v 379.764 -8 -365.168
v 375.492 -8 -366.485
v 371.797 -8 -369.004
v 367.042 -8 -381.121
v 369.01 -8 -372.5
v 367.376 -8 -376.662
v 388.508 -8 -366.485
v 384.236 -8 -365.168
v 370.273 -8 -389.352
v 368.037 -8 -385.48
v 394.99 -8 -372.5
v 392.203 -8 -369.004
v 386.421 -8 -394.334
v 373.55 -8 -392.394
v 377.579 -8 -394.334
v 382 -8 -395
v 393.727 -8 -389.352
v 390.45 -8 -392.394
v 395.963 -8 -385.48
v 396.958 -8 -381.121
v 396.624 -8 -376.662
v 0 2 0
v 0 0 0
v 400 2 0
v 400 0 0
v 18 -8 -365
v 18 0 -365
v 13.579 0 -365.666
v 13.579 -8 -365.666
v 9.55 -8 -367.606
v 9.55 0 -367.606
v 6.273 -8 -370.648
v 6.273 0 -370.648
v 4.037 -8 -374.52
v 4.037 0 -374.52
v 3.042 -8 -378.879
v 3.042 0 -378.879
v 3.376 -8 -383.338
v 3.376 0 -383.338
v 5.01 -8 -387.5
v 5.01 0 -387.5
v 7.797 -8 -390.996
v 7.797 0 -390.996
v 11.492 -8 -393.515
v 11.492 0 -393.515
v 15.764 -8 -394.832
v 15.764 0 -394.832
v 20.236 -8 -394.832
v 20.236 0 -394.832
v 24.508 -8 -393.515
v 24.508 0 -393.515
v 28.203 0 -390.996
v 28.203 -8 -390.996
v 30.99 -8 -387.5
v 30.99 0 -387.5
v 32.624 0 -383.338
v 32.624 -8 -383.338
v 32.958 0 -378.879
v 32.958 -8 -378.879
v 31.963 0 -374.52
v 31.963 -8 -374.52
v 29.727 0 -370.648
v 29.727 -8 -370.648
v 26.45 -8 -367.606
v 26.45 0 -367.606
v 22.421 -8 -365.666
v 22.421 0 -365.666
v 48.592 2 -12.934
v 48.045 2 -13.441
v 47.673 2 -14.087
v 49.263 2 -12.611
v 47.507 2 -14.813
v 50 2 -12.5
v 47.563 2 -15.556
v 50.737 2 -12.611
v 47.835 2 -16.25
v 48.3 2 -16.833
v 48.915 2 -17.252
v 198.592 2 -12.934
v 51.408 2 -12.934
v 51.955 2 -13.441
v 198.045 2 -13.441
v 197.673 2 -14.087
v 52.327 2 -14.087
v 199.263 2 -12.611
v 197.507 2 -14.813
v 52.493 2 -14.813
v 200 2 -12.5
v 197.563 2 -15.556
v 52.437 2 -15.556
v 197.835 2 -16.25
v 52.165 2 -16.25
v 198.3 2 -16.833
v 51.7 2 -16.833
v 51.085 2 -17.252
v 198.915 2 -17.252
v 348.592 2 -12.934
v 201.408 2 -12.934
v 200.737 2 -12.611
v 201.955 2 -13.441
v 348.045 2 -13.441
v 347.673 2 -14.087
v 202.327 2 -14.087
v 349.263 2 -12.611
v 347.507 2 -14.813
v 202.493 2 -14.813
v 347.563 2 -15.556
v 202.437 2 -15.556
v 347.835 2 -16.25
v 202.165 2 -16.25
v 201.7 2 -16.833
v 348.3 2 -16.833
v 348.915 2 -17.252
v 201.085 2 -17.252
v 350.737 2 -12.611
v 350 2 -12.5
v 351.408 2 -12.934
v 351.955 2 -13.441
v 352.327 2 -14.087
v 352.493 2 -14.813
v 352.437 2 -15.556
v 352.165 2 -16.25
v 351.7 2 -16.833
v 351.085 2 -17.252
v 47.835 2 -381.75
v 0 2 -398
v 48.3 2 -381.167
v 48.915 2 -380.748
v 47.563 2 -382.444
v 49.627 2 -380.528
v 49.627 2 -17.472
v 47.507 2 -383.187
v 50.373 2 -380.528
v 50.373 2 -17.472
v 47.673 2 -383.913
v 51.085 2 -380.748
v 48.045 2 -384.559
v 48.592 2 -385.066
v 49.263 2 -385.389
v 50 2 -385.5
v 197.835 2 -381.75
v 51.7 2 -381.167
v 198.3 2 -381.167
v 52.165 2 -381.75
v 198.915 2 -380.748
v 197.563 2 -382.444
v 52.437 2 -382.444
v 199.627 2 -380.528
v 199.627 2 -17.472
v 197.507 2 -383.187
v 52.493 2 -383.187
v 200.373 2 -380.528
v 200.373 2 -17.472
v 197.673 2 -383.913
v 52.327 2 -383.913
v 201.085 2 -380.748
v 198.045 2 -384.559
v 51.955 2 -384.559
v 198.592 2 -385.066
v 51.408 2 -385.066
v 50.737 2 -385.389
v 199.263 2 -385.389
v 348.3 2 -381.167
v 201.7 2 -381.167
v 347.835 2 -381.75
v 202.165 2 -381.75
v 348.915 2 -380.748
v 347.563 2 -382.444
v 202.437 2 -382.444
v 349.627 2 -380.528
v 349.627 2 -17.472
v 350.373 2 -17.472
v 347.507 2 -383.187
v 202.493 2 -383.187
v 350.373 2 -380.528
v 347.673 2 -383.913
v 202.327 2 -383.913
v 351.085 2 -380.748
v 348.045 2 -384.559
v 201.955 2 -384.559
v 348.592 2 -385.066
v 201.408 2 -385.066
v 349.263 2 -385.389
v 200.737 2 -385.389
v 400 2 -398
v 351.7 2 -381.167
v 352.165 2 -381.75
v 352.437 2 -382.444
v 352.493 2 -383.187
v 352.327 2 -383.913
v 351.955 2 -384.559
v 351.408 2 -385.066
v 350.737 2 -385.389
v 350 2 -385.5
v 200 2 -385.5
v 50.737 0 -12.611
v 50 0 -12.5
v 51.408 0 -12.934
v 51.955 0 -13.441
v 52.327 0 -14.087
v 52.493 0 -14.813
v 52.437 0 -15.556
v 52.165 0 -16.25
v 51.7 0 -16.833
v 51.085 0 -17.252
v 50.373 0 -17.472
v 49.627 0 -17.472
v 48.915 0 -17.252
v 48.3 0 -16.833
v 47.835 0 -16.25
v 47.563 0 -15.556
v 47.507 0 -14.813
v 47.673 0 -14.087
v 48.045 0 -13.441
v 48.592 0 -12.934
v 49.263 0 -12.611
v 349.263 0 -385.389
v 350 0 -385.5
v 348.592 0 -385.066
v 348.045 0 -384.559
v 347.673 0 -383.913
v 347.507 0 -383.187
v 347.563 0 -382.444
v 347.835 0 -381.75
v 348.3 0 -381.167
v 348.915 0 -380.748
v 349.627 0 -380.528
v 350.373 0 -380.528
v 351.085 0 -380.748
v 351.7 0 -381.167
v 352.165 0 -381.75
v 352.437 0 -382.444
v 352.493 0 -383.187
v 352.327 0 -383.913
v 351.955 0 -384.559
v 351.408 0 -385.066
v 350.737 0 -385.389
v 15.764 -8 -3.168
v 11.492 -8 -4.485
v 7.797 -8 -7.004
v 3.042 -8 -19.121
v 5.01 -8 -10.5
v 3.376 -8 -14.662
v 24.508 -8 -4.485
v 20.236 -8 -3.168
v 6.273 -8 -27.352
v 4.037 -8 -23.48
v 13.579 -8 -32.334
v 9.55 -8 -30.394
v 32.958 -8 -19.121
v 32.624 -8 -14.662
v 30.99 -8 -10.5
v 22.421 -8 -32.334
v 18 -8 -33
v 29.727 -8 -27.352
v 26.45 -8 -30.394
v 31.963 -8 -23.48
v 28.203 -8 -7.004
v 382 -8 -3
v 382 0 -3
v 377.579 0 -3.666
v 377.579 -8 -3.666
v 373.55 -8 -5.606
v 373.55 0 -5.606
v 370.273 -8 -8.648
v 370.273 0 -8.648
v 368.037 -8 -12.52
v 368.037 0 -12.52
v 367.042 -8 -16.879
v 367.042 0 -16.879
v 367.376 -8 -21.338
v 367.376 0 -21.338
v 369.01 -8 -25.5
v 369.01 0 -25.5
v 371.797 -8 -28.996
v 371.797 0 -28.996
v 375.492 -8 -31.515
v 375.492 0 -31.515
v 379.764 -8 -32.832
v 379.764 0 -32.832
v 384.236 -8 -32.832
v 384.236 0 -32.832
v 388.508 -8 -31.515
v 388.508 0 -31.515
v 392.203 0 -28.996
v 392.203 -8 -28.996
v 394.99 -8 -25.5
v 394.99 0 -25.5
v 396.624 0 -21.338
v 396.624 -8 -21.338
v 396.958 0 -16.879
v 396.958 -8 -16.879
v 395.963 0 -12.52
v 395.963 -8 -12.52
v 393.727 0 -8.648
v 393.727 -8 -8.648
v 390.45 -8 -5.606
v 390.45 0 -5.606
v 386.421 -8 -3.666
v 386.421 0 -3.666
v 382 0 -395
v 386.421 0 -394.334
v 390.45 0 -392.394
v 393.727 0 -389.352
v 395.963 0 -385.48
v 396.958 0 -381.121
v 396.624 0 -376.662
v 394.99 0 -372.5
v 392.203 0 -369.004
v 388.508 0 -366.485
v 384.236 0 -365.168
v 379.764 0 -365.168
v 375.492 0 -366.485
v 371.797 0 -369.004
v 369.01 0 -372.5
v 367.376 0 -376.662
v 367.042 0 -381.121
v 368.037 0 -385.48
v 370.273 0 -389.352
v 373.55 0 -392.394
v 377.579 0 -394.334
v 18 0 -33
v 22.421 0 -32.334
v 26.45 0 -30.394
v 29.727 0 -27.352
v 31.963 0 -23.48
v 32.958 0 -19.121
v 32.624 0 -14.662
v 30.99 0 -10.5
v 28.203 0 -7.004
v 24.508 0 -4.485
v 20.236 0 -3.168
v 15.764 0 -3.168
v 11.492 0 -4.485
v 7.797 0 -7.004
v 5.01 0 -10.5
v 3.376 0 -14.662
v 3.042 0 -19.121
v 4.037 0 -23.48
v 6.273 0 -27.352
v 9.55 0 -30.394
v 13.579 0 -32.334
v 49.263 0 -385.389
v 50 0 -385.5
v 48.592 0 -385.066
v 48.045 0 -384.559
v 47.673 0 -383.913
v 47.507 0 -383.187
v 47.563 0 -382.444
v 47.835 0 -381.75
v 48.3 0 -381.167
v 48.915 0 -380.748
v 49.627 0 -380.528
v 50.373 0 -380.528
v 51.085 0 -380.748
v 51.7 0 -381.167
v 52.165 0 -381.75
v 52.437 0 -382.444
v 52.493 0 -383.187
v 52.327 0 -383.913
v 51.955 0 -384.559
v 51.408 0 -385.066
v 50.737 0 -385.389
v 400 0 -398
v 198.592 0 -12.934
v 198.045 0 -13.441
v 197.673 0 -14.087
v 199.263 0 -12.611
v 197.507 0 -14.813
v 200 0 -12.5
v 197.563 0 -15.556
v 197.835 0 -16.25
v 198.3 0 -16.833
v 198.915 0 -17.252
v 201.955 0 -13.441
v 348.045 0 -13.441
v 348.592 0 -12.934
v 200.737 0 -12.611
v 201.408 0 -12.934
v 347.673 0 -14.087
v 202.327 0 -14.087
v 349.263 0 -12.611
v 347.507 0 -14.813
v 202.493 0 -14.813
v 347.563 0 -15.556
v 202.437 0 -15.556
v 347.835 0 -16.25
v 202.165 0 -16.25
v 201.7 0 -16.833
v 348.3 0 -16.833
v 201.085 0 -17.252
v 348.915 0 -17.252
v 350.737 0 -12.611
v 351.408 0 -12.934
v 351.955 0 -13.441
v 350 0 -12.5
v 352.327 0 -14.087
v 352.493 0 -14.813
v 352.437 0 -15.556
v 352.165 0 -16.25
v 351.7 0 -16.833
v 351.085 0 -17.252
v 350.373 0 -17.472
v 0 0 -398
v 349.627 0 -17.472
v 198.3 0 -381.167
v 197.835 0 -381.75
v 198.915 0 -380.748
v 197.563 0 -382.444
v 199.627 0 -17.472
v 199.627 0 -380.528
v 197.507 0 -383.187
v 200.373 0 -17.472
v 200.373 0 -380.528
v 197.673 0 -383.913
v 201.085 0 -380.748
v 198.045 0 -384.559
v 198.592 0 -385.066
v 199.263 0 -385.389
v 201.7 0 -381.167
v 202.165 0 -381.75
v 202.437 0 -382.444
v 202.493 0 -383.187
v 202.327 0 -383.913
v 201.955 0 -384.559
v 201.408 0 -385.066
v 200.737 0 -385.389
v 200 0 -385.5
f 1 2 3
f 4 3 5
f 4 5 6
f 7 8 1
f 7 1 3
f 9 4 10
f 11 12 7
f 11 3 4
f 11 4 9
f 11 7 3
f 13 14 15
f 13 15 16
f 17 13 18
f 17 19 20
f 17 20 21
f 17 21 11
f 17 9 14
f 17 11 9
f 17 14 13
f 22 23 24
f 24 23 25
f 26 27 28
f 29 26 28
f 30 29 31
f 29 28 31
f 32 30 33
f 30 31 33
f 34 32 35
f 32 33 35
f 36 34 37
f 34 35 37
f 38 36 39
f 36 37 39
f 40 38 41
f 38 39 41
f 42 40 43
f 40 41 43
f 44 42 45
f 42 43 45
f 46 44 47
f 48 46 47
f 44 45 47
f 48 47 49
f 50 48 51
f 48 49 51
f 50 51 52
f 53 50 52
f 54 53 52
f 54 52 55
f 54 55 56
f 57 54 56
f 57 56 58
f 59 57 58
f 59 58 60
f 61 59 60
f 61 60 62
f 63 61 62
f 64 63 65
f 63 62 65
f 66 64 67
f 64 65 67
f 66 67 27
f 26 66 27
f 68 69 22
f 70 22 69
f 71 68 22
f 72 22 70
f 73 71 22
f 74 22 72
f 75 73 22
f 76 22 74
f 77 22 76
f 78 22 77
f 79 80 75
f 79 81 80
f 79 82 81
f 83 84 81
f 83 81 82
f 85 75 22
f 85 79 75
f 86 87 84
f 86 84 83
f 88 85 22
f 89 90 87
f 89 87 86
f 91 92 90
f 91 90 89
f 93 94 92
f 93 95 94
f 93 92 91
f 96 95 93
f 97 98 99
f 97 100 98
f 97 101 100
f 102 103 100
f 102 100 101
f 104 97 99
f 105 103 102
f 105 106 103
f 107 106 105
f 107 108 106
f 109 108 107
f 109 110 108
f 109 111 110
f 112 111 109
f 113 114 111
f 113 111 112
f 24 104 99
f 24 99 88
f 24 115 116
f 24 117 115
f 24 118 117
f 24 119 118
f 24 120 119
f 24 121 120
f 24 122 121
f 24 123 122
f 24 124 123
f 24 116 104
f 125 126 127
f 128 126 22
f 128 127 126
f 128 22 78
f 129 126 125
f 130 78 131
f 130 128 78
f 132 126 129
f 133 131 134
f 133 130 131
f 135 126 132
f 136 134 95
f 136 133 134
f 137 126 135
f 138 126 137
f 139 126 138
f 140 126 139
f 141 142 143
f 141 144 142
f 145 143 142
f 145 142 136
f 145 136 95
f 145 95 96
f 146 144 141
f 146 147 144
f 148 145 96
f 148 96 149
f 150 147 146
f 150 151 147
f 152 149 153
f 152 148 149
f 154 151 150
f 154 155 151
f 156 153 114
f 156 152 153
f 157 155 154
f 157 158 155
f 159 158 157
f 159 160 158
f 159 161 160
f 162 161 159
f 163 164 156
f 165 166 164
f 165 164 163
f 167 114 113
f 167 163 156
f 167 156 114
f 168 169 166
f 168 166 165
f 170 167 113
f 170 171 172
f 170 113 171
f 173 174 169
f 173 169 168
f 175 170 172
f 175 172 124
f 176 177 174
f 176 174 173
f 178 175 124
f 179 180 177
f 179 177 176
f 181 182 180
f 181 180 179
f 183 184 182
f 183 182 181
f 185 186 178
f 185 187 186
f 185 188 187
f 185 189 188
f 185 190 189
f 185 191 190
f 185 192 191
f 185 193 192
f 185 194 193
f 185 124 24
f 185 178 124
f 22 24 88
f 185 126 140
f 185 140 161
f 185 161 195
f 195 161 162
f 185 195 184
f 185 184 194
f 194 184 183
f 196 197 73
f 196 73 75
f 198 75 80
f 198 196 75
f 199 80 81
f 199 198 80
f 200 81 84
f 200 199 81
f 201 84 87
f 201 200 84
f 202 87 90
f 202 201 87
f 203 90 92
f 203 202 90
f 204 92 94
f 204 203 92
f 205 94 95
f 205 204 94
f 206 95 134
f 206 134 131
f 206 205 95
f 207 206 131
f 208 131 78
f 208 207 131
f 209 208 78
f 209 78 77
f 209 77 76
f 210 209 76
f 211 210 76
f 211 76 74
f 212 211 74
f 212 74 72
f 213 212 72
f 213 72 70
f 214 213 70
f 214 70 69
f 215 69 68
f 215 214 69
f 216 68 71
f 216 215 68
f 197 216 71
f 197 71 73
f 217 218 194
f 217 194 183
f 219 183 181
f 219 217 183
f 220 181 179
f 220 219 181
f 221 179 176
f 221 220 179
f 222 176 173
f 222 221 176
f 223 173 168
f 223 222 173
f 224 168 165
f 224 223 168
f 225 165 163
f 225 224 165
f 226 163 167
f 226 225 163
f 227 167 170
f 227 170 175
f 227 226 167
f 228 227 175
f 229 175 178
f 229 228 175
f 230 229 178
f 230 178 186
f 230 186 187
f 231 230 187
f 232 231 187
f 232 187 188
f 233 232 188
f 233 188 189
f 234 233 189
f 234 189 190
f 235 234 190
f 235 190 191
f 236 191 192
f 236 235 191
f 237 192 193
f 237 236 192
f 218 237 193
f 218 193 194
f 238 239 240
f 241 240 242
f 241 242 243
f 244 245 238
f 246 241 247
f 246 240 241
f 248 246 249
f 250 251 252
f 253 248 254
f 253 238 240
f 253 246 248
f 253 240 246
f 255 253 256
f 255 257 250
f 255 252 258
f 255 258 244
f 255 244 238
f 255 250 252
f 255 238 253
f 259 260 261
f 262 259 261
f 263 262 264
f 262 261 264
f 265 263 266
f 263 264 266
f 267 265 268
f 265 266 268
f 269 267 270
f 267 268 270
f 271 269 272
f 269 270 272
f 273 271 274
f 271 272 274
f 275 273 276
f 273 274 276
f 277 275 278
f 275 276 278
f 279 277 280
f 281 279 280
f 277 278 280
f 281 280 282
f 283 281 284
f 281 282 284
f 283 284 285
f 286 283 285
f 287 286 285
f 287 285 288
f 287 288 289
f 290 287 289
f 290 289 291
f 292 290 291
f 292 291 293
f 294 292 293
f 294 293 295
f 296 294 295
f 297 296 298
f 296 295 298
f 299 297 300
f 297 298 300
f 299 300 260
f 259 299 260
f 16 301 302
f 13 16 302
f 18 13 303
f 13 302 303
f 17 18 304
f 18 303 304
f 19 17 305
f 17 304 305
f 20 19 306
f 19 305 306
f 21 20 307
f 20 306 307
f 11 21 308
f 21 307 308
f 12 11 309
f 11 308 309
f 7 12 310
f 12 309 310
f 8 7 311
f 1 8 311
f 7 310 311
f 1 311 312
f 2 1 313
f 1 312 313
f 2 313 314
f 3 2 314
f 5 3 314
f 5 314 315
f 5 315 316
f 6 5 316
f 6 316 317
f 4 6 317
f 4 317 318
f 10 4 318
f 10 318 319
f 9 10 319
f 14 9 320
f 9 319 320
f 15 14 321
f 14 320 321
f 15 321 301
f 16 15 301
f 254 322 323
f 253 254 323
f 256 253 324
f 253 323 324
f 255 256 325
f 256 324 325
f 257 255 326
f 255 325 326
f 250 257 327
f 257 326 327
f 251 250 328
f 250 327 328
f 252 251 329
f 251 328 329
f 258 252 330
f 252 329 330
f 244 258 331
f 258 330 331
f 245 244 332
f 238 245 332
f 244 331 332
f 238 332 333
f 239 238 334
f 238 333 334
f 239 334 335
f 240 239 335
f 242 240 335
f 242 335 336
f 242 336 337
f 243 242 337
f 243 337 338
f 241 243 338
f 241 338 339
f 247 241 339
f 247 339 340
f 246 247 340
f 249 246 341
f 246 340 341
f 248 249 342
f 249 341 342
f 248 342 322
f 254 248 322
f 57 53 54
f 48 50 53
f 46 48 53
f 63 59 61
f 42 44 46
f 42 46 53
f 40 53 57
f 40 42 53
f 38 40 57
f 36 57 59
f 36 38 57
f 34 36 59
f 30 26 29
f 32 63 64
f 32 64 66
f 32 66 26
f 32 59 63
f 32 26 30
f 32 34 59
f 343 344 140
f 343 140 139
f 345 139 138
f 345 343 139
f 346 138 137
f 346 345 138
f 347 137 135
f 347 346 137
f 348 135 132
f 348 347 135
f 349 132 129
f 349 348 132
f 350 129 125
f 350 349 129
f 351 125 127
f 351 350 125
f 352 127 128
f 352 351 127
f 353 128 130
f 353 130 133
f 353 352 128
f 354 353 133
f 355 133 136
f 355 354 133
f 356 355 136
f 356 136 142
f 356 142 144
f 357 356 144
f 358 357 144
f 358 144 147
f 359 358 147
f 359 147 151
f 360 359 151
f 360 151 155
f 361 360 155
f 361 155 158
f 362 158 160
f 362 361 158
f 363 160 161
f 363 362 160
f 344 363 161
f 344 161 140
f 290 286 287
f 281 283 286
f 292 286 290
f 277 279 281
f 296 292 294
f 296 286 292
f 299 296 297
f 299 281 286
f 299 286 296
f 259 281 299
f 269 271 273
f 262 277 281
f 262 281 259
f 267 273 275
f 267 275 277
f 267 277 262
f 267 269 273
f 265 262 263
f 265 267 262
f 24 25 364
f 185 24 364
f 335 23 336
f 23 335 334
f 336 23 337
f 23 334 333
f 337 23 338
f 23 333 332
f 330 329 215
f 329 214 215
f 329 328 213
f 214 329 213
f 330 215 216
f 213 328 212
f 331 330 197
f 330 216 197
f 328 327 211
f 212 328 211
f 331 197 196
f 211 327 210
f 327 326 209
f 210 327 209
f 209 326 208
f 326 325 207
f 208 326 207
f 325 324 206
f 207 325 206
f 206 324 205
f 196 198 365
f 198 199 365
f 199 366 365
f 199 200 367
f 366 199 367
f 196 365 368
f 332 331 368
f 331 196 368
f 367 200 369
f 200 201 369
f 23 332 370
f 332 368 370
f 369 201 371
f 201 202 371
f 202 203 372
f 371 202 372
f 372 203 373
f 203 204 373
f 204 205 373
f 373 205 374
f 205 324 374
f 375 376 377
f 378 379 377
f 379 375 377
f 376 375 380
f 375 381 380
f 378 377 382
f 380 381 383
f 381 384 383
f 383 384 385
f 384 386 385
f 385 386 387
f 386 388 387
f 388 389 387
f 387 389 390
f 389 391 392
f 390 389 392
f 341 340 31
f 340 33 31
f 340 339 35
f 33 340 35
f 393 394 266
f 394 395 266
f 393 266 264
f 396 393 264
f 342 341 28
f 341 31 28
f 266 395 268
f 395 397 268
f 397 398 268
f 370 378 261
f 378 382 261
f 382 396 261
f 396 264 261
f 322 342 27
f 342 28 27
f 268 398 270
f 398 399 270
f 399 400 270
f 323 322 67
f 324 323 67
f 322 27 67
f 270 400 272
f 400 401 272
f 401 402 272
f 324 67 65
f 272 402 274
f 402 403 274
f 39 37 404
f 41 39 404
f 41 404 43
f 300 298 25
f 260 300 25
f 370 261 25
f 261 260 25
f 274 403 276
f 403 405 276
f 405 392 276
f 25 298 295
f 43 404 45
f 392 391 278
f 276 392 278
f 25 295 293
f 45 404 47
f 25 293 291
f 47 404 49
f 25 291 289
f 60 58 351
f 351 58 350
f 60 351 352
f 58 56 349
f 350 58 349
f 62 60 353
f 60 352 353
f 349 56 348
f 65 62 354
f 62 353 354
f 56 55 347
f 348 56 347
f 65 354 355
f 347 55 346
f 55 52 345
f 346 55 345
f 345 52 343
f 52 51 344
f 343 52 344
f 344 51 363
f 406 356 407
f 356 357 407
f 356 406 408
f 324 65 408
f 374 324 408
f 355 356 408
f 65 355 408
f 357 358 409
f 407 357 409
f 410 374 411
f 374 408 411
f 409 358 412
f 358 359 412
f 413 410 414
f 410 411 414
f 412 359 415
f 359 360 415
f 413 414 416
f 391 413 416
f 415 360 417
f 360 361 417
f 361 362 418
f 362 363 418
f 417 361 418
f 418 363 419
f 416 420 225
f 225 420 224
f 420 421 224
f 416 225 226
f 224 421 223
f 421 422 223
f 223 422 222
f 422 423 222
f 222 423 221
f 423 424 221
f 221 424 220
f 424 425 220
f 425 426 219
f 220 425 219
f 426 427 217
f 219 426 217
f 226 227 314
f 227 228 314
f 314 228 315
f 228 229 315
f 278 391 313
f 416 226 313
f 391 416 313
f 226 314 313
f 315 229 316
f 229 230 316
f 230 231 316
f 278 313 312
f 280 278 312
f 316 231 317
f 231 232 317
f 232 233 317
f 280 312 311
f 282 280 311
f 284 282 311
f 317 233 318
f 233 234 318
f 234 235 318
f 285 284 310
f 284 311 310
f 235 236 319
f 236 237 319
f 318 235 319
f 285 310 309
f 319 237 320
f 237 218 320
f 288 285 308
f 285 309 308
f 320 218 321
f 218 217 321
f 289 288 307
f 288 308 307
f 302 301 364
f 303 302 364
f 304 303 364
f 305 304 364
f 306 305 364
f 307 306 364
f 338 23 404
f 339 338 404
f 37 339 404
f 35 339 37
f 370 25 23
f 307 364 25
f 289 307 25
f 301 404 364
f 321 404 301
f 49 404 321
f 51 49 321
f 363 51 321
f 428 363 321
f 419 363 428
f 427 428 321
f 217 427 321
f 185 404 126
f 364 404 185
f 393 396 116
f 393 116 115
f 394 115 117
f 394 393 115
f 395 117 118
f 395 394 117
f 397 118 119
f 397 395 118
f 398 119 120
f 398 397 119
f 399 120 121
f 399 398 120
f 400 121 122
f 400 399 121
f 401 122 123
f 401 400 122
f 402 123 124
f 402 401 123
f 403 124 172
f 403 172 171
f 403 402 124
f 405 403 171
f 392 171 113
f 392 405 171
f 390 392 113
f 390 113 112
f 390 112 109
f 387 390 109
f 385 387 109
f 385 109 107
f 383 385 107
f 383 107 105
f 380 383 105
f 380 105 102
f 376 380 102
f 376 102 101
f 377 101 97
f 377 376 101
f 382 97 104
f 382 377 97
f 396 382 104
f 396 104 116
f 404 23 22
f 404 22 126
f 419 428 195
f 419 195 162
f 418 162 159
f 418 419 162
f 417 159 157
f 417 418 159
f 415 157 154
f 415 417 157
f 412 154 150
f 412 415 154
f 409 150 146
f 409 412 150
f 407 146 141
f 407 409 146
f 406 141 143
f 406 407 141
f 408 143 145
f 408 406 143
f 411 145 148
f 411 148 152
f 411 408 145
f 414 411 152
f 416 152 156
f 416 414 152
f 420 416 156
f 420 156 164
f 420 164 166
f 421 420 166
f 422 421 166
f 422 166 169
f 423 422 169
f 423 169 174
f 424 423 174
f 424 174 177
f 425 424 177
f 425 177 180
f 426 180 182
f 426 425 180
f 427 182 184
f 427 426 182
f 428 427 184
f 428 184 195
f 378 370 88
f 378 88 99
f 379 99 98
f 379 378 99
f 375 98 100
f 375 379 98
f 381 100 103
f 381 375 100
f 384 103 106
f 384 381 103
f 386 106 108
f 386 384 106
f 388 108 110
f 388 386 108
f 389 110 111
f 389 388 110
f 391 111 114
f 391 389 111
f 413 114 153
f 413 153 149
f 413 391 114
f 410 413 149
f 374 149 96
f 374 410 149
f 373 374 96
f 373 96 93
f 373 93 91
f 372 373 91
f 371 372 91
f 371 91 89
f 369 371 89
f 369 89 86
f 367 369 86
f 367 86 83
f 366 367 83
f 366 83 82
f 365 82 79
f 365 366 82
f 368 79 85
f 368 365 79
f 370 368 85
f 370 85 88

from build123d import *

# Parameters (mm, degrees)
SKETCH1_W           = 400
SKETCH1_H           = 398
SKETCH1_R           = 2.5
BOSS_EXTRUDE1_DEPTH = 2
SKETCH2_R           = 15
BOSS_EXTRUDE2_DEPTH = 8


with BuildPart() as part:
    # Sketch1 → Boss-Extrude1 (new body)
    with BuildSketch(Plane(origin=(0, 0, 0), x_dir=(1, 0, 0), z_dir=(0, 1, 0))):
        with Locations((200, 199)):
            Rectangle(SKETCH1_W, SKETCH1_H)
        with Locations(Location((50, 15, 0), (0, 0, 270))):
            Circle(SKETCH1_R, mode=Mode.SUBTRACT)
        with Locations(Location((200, 15, 0), (0, 0, 270))):
            Circle(SKETCH1_R, mode=Mode.SUBTRACT)
        with Locations(Location((350, 15, 0), (0, 0, 270))):
            Circle(SKETCH1_R, mode=Mode.SUBTRACT)
        with Locations(Location((350, 383, 0), (0, 0, 90))):
            Circle(SKETCH1_R, mode=Mode.SUBTRACT)
        with Locations(Location((200, 383, 0), (0, 0, 90))):
            Circle(SKETCH1_R, mode=Mode.SUBTRACT)
        with Locations(Location((50, 383, 0), (0, 0, 90))):
            Circle(SKETCH1_R, mode=Mode.SUBTRACT)
    extrude(amount=BOSS_EXTRUDE1_DEPTH)

    # Sketch2 → Boss-Extrude2 (add)
    with BuildSketch(Plane.XZ):
        with Locations(Location((18, -18, 0), (0, 0, 270))):
            Circle(SKETCH2_R)
        with Locations(Location((382, -18, 0), (0, 0, 90))):
            Circle(SKETCH2_R)
        with Locations(Location((382, -380, 0), (0, 0, 270))):
            Circle(SKETCH2_R)
        with Locations(Location((18, -380, 0), (0, 0, 90))):
            Circle(SKETCH2_R)
    extrude(amount=BOSS_EXTRUDE2_DEPTH)


solid = part.part
